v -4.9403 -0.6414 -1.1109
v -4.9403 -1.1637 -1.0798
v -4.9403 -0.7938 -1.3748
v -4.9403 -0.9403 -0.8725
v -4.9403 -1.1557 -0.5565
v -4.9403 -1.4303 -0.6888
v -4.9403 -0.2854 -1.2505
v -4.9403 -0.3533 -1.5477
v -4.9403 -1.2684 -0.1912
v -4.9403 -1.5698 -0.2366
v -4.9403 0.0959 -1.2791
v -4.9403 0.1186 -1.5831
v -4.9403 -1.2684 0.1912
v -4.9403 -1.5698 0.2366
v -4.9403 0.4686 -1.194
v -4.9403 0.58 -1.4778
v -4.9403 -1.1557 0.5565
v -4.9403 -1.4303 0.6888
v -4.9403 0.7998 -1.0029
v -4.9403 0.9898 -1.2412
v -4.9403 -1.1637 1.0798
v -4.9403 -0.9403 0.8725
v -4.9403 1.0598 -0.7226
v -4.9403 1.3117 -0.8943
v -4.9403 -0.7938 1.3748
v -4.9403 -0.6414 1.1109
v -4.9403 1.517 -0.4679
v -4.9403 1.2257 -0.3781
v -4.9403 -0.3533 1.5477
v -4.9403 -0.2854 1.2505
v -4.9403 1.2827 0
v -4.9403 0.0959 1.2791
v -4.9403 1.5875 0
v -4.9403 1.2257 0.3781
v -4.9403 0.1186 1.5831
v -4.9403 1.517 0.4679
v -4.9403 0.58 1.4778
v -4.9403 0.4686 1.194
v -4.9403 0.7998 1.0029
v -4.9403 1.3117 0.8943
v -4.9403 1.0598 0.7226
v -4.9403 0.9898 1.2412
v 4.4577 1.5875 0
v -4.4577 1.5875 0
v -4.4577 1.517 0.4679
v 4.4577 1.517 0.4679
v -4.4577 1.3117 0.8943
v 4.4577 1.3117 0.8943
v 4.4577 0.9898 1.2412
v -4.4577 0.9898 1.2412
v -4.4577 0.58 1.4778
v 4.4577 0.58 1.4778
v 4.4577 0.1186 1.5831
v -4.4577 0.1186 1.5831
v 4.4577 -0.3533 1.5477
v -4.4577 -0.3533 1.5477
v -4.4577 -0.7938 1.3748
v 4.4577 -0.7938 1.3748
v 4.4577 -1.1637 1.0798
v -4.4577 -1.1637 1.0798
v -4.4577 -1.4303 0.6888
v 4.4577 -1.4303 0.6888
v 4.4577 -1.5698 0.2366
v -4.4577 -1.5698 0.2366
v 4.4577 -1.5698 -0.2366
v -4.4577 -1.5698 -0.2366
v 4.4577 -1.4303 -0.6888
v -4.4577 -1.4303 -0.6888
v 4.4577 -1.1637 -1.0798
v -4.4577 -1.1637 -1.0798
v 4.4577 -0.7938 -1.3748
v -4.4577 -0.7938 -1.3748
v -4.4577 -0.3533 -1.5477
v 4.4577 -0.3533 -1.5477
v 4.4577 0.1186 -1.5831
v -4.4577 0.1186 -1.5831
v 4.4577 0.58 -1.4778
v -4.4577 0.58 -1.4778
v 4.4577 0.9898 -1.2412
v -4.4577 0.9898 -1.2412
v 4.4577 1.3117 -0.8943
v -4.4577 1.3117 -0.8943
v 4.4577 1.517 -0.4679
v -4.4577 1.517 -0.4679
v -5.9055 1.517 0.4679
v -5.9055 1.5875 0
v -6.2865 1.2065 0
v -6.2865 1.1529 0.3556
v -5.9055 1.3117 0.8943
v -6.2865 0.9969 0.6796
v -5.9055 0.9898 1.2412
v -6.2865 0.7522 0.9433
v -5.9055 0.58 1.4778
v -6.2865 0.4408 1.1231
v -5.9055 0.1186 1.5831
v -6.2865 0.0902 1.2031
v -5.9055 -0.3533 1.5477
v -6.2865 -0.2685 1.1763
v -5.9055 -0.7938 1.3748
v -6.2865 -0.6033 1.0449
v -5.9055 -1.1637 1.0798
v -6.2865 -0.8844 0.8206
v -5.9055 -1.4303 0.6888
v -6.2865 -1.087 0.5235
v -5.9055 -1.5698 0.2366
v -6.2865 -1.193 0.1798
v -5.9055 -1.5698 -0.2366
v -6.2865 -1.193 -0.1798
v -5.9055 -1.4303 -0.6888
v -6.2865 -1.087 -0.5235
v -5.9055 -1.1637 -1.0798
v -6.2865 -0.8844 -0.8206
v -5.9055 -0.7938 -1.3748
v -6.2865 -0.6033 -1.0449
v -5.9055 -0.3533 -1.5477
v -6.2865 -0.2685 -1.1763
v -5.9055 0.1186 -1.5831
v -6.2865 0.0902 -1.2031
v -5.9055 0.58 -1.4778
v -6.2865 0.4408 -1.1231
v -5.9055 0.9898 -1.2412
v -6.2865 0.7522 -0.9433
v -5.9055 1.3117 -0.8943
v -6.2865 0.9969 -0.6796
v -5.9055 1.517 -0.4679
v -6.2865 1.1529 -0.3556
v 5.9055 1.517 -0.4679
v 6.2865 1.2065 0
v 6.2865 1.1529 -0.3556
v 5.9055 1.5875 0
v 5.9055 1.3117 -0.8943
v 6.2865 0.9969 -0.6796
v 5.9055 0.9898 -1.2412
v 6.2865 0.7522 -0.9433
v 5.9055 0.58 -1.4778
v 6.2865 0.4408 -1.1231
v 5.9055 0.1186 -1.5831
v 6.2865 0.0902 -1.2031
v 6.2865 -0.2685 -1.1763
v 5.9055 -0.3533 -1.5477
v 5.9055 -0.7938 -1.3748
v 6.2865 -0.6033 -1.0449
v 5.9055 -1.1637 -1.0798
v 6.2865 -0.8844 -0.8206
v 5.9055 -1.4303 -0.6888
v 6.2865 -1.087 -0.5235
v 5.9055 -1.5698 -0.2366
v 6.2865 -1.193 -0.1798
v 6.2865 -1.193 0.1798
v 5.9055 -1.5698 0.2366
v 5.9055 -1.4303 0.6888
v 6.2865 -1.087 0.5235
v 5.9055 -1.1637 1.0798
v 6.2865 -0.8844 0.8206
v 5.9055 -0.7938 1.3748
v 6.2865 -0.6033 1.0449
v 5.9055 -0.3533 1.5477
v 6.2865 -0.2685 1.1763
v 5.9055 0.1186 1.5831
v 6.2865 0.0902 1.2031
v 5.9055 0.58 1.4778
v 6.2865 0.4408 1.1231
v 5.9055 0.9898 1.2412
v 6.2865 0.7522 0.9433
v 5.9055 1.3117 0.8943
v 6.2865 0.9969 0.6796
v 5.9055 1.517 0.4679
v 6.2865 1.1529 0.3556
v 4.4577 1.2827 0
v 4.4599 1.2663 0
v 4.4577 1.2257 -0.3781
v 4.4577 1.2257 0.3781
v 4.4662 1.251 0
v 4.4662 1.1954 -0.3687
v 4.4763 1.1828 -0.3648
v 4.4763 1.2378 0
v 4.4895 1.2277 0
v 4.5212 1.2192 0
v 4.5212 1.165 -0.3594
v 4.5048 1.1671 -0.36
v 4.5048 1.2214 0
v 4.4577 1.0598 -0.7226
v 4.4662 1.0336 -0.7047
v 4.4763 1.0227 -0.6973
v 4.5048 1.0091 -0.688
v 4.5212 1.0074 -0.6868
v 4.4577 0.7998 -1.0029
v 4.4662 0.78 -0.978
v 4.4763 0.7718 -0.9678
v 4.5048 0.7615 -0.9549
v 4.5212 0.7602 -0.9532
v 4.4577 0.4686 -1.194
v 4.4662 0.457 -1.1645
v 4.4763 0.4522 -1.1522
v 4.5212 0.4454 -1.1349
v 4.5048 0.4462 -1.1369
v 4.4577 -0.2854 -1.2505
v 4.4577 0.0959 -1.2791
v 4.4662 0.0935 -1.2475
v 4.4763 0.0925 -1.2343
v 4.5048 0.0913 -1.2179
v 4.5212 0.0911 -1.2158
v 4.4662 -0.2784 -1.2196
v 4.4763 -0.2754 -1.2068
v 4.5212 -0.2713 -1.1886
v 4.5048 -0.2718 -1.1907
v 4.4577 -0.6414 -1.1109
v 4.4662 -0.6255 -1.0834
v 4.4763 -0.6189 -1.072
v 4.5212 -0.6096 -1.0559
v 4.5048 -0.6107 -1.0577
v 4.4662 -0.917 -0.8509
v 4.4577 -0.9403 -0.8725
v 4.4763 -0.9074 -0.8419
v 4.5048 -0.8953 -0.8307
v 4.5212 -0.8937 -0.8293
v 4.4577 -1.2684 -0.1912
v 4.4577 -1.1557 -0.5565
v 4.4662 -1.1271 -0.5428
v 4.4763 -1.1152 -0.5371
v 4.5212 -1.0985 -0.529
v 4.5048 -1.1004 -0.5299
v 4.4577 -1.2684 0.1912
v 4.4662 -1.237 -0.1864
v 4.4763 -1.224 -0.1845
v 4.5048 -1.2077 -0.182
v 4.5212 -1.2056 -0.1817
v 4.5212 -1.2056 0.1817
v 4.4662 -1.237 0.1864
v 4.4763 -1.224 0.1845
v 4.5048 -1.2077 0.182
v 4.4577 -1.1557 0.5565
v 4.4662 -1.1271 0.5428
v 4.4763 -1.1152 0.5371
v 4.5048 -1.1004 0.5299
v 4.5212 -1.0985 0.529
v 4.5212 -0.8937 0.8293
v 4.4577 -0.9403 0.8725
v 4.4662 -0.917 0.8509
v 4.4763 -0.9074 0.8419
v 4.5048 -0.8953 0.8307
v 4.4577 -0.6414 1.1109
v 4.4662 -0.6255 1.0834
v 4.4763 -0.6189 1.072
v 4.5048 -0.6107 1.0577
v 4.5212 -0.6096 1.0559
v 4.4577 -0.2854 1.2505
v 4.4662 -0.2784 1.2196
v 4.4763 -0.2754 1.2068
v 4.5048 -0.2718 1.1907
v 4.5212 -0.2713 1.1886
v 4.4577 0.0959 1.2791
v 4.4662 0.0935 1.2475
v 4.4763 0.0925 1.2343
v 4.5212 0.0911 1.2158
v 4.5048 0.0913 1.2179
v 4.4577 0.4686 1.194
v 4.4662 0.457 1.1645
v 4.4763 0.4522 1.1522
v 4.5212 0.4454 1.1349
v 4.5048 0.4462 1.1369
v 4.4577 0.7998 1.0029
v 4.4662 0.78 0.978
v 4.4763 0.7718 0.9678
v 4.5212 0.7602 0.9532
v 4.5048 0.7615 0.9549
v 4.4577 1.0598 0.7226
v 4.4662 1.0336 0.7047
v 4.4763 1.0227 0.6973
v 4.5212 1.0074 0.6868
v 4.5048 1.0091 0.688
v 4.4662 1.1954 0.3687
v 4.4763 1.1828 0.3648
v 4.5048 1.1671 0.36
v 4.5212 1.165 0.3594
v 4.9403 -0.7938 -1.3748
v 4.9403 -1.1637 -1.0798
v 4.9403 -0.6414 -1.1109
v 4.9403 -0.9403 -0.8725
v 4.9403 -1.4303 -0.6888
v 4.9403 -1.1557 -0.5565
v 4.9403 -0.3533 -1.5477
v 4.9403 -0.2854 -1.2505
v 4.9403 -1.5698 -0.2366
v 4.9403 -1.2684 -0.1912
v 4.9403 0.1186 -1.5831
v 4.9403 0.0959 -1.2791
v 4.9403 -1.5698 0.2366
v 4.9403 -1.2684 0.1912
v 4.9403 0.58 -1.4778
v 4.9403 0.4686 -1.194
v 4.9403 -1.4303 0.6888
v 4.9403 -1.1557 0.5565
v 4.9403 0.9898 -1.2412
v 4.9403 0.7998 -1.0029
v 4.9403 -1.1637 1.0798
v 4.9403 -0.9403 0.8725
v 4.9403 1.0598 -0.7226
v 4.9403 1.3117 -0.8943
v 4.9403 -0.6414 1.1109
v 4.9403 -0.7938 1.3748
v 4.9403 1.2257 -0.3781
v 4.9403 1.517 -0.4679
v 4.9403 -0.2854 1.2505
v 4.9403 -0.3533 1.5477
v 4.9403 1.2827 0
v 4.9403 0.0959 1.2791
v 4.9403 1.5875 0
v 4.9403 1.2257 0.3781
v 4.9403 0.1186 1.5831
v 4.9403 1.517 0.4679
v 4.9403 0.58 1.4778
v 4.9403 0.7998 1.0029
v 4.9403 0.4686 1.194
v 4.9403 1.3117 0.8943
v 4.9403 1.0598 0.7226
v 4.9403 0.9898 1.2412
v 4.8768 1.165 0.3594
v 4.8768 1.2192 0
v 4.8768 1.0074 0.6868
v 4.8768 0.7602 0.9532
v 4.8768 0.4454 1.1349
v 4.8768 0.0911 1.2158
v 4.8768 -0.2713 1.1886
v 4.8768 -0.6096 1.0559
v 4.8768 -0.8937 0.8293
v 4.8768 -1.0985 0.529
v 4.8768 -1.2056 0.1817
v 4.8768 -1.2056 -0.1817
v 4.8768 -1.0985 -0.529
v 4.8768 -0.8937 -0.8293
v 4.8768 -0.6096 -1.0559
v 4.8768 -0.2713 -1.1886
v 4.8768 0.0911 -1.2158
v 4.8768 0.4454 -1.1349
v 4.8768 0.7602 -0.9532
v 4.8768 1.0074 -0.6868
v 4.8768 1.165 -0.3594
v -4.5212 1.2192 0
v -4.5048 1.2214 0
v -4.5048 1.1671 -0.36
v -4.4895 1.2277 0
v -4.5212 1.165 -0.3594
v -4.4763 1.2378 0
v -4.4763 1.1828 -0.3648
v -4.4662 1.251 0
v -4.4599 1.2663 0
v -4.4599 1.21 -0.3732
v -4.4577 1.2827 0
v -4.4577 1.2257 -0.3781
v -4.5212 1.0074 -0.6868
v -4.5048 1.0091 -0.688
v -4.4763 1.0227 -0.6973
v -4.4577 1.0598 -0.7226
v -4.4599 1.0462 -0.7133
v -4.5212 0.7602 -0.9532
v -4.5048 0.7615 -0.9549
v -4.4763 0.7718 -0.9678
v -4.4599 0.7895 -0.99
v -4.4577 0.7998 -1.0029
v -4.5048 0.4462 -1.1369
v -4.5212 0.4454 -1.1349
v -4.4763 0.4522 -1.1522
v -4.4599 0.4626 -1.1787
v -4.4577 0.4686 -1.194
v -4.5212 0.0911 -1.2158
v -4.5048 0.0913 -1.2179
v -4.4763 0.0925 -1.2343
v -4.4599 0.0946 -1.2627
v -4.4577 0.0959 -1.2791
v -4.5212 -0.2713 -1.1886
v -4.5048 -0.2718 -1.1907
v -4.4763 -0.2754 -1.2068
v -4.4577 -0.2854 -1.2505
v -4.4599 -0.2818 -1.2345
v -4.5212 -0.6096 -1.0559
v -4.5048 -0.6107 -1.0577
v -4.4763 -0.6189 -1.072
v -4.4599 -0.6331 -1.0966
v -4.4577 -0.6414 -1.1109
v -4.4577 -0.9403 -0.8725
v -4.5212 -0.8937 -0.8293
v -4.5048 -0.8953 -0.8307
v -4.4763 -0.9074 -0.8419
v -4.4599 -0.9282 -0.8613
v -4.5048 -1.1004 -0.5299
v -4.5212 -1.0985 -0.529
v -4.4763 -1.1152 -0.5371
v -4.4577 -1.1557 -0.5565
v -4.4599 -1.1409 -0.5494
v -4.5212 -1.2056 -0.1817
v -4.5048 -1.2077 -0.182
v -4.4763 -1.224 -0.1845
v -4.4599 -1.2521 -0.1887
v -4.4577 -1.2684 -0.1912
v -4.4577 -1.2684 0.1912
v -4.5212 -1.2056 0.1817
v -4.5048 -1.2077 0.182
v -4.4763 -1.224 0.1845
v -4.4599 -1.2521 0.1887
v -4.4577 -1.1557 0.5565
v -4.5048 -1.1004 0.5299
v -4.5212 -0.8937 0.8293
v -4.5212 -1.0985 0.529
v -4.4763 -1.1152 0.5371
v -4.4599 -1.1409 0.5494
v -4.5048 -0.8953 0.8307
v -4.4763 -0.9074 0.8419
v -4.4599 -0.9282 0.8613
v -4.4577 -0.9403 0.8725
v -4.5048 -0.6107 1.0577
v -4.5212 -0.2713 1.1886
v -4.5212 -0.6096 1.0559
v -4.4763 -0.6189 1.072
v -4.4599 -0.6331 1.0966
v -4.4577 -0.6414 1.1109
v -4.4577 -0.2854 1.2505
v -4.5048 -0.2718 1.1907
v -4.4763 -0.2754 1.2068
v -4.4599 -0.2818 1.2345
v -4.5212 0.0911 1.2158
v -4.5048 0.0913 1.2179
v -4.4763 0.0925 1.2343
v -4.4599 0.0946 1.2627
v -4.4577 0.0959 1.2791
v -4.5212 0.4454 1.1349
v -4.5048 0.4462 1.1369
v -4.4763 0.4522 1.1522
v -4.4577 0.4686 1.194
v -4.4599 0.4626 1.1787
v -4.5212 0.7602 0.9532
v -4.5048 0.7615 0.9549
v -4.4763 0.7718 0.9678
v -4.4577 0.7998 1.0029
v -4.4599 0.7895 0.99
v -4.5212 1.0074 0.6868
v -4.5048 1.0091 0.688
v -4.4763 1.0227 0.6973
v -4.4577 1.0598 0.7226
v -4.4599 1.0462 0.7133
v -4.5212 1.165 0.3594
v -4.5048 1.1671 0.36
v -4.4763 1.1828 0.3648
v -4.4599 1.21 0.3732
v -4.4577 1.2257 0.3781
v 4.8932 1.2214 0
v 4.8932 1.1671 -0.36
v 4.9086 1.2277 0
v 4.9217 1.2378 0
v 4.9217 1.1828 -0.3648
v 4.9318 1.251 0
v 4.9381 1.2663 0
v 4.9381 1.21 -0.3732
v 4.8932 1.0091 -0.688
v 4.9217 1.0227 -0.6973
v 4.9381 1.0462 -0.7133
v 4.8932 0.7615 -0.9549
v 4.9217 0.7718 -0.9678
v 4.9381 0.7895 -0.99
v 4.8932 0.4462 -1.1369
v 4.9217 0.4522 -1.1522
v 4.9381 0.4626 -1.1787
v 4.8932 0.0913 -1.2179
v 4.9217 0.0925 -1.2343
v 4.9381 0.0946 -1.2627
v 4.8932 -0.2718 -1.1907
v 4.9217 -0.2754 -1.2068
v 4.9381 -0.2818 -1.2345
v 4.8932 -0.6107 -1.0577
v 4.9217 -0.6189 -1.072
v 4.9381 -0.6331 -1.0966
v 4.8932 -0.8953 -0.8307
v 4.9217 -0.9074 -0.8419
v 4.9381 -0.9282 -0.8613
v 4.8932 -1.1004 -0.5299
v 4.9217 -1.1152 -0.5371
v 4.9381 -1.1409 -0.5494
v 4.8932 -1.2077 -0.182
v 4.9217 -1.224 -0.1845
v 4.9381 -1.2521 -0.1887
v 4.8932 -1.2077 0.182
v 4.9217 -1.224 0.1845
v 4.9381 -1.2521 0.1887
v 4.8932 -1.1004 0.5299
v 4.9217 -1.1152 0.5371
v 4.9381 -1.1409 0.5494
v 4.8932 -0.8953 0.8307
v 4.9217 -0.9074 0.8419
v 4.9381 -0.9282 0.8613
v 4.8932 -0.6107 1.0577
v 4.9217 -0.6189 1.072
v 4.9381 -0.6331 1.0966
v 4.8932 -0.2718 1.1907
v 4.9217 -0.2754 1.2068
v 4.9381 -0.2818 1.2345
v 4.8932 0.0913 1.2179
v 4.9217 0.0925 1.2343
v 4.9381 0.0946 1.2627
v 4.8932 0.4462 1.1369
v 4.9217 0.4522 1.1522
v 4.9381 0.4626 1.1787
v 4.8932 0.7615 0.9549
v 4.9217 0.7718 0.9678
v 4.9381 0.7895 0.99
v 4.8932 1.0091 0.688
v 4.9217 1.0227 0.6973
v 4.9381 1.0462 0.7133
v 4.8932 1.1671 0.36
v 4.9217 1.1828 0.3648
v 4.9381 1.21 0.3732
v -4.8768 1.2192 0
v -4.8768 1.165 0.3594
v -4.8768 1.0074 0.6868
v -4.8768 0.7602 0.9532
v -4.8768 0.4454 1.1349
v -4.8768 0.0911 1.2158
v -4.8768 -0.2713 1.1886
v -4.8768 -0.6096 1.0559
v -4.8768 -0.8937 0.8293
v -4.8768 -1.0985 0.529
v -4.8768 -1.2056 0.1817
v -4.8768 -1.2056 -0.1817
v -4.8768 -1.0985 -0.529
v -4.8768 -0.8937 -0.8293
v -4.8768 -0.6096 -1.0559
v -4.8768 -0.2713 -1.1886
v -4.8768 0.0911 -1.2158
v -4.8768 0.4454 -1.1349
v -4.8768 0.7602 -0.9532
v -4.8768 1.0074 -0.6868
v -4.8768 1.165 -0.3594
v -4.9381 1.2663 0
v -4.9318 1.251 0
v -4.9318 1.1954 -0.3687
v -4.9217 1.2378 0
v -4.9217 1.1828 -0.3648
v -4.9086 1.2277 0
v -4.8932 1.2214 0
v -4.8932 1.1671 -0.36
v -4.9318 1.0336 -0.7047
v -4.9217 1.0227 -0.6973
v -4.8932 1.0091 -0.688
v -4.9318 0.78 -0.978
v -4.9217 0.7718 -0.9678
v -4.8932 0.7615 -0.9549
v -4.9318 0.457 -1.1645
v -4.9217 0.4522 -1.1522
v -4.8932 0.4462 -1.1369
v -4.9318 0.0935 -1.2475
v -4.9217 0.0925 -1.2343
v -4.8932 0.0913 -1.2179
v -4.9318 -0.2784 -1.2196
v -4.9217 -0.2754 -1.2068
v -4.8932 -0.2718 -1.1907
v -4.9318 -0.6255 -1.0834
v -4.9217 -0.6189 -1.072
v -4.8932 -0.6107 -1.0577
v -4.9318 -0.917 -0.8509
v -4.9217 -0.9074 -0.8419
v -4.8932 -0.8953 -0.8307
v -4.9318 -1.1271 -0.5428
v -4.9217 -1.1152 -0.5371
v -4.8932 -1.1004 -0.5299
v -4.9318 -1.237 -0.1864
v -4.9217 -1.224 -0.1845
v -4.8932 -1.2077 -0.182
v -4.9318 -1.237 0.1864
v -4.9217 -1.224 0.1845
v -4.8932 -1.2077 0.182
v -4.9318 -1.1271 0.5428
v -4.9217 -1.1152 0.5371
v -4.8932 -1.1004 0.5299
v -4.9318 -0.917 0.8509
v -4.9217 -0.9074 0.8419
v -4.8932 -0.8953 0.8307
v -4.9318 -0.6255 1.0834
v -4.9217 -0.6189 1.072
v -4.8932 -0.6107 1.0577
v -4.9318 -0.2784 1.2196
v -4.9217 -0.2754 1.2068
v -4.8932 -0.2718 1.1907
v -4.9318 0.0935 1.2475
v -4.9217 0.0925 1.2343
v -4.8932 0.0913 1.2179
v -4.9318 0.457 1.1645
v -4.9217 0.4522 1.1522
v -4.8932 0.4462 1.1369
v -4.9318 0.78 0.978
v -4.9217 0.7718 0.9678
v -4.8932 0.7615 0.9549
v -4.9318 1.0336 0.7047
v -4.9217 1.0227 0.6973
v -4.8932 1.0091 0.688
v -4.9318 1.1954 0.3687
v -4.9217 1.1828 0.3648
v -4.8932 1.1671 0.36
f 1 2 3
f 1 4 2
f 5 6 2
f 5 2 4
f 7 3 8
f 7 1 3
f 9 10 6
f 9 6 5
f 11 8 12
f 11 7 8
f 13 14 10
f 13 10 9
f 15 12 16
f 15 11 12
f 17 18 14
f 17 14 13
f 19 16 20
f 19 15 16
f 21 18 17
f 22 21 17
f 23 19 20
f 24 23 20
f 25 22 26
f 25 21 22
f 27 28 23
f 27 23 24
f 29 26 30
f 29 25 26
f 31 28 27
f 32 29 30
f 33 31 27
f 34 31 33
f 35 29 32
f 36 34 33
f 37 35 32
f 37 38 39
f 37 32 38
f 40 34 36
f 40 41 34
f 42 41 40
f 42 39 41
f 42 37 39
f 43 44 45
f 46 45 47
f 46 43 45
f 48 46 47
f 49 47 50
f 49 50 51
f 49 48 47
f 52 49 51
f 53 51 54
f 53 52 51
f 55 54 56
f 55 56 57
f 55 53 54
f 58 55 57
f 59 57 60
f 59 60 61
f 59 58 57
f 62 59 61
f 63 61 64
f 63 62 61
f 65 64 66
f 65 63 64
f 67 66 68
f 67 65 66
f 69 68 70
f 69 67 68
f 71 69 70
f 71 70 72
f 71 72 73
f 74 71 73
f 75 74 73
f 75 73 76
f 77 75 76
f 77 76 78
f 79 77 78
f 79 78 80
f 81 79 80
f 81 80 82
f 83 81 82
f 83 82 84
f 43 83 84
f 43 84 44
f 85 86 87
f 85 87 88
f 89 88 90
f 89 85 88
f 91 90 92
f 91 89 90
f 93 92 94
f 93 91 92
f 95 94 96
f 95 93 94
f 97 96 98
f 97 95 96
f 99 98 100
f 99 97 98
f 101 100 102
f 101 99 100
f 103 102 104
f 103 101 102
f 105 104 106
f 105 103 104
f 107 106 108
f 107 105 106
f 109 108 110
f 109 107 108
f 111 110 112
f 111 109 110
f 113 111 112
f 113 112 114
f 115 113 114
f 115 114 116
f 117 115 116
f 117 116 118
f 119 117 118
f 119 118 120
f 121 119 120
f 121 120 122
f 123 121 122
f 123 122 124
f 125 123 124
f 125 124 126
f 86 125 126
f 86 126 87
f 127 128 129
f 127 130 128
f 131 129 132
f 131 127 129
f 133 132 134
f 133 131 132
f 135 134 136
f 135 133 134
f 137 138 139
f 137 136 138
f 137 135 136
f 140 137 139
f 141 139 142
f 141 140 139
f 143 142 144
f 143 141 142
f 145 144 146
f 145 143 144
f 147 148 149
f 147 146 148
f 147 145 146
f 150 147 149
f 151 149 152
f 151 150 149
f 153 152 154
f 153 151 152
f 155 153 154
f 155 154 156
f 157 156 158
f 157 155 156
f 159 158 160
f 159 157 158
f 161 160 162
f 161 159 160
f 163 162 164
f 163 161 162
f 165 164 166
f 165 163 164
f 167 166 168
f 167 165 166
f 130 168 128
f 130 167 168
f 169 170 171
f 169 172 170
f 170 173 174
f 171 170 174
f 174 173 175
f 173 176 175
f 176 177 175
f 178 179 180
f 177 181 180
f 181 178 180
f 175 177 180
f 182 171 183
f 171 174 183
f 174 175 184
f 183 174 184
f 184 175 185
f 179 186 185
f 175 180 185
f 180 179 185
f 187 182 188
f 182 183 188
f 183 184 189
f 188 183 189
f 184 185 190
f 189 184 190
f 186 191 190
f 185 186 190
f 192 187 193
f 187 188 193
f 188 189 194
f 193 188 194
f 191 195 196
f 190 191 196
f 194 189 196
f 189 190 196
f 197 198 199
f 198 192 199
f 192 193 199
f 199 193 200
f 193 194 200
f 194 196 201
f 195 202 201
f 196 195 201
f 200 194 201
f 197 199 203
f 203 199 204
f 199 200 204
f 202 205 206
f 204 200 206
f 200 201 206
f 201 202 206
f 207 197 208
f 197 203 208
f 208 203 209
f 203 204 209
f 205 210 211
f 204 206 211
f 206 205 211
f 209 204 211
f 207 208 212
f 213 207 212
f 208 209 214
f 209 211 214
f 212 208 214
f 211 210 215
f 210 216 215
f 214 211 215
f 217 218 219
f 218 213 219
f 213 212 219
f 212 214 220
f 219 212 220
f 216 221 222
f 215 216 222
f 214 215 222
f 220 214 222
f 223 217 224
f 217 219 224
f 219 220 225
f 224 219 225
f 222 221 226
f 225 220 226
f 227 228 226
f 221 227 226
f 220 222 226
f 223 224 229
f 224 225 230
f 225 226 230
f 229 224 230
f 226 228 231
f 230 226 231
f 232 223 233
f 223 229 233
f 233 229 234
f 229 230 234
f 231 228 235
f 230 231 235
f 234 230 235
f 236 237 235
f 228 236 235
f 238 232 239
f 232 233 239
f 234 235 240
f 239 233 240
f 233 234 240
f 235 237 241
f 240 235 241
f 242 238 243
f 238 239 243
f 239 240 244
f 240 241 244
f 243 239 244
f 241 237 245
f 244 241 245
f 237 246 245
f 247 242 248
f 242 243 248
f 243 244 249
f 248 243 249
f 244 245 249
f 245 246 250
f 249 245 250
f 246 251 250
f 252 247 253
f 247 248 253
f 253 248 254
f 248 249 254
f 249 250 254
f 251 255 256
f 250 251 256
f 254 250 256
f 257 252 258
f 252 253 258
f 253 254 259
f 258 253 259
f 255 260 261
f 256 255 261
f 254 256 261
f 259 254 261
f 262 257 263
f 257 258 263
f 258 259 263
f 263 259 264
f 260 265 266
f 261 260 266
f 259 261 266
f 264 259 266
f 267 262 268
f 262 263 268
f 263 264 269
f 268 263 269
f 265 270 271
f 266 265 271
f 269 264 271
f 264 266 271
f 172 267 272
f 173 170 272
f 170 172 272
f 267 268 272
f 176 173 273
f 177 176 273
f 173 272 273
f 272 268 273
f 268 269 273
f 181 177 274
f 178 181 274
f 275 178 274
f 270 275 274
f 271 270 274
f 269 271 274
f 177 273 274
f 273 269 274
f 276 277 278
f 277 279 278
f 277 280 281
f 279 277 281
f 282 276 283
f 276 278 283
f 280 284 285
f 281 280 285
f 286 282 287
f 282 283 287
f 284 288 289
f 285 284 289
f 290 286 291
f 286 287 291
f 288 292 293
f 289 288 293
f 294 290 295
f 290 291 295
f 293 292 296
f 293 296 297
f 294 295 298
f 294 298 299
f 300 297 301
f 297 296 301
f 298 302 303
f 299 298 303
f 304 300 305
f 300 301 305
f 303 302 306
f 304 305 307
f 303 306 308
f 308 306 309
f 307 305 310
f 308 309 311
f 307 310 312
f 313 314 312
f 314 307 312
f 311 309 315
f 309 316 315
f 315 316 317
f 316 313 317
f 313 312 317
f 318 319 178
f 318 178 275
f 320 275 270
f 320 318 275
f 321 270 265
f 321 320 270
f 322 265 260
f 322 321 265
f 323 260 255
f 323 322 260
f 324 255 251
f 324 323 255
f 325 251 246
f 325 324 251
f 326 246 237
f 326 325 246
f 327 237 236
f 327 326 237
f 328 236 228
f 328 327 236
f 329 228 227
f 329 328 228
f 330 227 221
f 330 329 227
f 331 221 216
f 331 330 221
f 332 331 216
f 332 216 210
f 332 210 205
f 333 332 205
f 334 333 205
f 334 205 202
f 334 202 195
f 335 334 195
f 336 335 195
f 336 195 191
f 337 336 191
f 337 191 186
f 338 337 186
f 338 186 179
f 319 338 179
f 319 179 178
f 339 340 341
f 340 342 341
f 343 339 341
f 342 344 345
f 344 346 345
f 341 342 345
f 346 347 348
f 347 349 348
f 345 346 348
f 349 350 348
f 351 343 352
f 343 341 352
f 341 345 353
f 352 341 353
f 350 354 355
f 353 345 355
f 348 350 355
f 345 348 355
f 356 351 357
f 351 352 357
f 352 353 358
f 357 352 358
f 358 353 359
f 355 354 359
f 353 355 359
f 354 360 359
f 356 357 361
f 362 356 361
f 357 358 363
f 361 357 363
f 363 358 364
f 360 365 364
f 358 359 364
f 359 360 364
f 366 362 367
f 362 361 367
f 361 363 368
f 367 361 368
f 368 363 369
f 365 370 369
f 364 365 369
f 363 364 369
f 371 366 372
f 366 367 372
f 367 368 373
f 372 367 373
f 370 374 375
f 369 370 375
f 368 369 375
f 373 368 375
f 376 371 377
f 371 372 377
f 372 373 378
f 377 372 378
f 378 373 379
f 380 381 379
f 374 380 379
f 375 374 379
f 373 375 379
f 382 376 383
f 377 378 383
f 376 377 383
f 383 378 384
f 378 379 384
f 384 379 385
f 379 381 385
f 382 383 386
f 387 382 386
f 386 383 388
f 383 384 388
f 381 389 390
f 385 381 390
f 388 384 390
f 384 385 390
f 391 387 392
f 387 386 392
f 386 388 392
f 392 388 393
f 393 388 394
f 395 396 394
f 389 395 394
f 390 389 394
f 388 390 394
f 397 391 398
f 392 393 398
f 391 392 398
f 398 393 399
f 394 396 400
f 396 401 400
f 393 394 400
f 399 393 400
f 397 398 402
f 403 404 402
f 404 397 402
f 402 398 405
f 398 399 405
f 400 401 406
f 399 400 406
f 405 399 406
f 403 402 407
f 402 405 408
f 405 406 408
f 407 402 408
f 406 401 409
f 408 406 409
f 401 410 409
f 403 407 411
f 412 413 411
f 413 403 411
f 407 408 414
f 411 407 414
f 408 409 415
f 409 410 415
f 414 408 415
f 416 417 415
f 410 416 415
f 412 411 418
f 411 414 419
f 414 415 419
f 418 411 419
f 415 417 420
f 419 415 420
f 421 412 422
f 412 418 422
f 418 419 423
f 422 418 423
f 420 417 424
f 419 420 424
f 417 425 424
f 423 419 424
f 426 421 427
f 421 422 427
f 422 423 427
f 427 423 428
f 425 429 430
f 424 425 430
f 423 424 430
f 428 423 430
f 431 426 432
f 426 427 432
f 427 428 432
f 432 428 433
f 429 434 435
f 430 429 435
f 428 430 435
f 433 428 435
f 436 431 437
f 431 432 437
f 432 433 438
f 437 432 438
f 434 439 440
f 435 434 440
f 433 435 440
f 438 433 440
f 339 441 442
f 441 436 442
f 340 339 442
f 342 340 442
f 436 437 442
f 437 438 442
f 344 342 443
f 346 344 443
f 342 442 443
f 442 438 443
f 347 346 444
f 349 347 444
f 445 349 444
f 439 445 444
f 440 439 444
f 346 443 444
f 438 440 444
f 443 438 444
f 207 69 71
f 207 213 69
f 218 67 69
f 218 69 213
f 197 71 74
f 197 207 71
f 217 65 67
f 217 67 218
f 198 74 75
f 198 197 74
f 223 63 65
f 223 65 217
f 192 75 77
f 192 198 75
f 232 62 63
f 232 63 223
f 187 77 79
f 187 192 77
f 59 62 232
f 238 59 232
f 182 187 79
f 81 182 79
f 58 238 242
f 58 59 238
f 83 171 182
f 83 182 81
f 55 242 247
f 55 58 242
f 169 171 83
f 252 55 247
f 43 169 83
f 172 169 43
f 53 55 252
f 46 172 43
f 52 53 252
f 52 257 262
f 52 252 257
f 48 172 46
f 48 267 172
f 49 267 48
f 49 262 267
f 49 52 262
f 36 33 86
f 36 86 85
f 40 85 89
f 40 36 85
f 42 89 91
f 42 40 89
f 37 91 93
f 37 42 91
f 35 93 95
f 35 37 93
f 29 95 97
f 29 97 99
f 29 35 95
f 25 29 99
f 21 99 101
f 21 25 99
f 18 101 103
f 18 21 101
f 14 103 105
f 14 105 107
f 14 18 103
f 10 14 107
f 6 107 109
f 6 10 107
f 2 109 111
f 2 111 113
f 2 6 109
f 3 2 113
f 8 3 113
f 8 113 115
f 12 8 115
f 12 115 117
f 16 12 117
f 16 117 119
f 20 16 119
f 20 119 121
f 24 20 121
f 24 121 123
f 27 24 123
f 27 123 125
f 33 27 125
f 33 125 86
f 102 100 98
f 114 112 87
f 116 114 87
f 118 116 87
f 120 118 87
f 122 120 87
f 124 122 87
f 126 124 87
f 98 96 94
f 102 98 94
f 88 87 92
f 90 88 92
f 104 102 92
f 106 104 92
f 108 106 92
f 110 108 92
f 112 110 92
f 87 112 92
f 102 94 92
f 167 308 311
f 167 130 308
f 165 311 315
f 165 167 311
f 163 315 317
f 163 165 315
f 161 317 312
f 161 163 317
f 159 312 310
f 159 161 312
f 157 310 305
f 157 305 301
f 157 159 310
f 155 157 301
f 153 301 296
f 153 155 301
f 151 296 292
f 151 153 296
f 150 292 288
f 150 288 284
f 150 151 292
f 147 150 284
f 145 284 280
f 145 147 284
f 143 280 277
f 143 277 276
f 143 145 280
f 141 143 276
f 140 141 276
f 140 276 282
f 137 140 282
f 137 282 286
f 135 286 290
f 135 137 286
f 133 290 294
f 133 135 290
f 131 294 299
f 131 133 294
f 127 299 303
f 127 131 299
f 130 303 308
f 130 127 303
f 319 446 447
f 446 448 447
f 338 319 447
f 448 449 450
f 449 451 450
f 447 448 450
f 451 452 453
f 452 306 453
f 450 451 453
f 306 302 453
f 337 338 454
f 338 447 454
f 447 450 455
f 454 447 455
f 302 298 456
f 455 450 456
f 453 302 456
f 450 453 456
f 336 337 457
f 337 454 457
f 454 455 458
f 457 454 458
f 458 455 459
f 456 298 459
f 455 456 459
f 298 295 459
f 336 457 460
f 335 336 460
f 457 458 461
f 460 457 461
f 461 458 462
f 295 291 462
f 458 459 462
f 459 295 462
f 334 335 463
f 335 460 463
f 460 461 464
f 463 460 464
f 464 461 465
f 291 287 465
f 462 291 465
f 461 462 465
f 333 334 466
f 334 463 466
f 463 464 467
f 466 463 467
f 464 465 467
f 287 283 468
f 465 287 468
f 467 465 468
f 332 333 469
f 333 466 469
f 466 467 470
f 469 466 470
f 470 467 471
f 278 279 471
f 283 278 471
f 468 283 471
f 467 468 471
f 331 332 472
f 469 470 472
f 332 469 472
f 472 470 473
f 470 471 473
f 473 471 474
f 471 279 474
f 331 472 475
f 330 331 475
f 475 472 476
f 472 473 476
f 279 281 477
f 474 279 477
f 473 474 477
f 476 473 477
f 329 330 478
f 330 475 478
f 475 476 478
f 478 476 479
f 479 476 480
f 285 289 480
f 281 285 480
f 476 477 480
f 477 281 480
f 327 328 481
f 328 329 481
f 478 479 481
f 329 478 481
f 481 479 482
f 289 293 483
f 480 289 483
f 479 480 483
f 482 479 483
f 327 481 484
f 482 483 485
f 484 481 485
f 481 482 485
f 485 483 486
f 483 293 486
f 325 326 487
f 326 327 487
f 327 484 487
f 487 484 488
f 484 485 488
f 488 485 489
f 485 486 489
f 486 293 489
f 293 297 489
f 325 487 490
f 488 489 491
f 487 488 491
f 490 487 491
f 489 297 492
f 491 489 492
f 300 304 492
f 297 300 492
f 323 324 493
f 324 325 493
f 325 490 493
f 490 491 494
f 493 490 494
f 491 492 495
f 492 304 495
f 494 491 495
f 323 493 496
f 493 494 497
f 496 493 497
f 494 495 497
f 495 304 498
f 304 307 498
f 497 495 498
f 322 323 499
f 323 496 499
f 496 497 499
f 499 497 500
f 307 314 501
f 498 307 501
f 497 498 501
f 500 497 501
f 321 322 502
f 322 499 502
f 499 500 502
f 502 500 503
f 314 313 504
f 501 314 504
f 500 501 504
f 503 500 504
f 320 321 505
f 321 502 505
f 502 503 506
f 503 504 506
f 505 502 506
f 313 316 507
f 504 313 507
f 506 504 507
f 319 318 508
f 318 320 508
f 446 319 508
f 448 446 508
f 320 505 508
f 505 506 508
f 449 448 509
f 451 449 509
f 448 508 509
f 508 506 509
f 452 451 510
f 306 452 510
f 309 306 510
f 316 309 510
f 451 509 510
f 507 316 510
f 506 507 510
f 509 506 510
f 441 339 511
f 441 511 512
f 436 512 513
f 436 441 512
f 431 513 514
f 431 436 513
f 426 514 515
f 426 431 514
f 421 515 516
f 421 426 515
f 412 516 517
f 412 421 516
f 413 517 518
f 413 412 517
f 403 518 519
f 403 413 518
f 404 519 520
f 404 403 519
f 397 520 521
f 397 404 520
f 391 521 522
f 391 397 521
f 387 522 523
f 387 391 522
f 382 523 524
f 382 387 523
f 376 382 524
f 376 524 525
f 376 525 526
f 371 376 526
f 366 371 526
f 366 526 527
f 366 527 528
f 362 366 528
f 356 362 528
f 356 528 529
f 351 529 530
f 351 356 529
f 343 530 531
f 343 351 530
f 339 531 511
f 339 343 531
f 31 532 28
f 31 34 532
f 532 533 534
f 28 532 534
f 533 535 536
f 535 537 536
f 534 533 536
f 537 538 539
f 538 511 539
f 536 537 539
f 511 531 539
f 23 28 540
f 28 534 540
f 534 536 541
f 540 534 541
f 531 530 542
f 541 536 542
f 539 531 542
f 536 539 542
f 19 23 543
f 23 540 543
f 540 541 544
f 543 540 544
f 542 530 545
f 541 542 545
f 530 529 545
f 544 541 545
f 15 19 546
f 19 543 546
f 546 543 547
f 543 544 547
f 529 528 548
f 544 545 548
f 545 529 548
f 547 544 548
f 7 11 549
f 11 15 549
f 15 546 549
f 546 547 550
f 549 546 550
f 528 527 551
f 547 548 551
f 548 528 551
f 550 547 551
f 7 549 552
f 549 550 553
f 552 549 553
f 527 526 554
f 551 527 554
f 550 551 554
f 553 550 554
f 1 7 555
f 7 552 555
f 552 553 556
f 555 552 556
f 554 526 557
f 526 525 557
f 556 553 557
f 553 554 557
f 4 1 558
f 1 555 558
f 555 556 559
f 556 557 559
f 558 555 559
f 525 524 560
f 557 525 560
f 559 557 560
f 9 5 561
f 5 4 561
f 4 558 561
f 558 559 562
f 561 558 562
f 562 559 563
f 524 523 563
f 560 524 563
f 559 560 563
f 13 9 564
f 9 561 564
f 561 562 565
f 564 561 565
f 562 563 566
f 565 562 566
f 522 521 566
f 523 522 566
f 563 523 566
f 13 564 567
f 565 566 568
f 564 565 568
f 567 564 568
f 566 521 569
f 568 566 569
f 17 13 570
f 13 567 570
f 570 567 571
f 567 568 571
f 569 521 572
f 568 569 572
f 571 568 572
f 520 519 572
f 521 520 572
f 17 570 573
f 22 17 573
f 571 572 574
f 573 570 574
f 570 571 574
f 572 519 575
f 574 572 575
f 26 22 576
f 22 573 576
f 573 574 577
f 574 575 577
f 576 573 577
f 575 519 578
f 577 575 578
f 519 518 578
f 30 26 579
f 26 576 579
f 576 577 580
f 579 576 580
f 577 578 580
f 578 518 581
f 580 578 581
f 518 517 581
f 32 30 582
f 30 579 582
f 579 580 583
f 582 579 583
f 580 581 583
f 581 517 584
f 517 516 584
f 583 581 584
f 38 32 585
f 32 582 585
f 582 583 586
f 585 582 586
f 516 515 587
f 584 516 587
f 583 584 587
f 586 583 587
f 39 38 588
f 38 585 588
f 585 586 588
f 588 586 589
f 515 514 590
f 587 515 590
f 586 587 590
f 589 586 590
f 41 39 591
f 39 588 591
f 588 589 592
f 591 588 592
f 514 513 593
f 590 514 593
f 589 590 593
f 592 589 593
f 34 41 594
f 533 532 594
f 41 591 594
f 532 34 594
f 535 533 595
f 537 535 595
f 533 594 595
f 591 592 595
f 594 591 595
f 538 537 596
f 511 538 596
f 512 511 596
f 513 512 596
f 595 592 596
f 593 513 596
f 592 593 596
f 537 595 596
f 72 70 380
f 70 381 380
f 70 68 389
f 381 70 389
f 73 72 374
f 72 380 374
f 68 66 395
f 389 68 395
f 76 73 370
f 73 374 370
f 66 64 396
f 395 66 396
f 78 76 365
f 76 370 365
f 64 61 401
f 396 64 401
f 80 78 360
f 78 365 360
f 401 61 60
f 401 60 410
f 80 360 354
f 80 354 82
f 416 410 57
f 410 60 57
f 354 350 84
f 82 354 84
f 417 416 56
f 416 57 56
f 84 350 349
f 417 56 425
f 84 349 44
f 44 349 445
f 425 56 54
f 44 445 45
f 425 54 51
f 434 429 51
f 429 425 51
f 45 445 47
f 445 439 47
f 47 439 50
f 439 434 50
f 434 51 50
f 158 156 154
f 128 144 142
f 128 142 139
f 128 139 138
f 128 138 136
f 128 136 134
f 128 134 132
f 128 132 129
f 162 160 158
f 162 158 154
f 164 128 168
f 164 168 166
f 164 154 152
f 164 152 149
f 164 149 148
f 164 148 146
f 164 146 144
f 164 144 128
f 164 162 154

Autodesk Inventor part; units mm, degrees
sketch "Sketch_1" plane through (0, 0, 0) normal (0, 0, 1) x (1, 0, 0)
  line L0 (6.2865, 0) -> (-6.2865, 0)
  line L1 (-6.2865, 0) -> (-6.2865, 1.2065)
  line L2 (-6.2865, 1.2065) -> (-5.9055, 1.5875)
  line L3 (-5.9055, 1.5875) -> (-4.9403, 1.5875)
  line L4 (-4.9403, 1.5875) -> (-4.9403, 1.2827)
  arc A0 (-4.9403, 1.2827) -> (-4.8768, 1.2192) centre (-4.8768, 1.2827) ccw
  line L5 (-4.8768, 1.2192) -> (-4.5212, 1.2192)
  arc A1 (-4.5212, 1.2192) -> (-4.4577, 1.2827) centre (-4.5212, 1.2827) ccw
  line L6 (-4.4577, 1.2827) -> (-4.4577, 1.5875)
  line L7 (-4.4577, 1.5875) -> (4.4577, 1.5875)
  line L8 (4.4577, 1.5875) -> (4.4577, 1.2827)
  arc A2 (4.4577, 1.2827) -> (4.5212, 1.2192) centre (4.5212, 1.2827) ccw
  line L9 (4.5212, 1.2192) -> (4.8768, 1.2192)
  arc A3 (4.8768, 1.2192) -> (4.9403, 1.2827) centre (4.8768, 1.2827) ccw
  line L10 (4.9403, 1.2827) -> (4.9403, 1.5875)
  line L11 (4.9403, 1.5875) -> (5.9055, 1.5875)
  line L12 (5.9055, 1.5875) -> (6.2865, 1.2065)
  line L13 (6.2865, 1.2065) -> (6.2865, 0)
  line L14 (6.2865, 0) -> (-6.2865, 0)
revolve "Revolution1" add sketch "Sketch_1" angle 360 about axis through (6.2865, 0, 0) along (1, 0, 0)
ref_plane "pin_XY" through (0, 0, 0) normal (1, 0, 0) x (0, 0, -1)
ref_plane "pin_YZ" through (0, 0, 0) normal (0, 0, -1) x (0, 1, 0)
ref_plane "pin_ZX" through (0, 0, 0) normal (0, 1, 0) x (1, 0, 0)
ref_plane "rr1_XY" through (4.699, 0, 0) normal (1, 0, 0) x (0, 0, -1)
ref_plane "rr1_YZ" through (4.699, 0, 0) normal (0, 0, -1) x (0, 1, 0)
ref_plane "rr1_ZX" through (4.699, 0, 0) normal (0, 1, 0) x (1, 0, 0)
ref_plane "rr2_XY" through (-4.699, 0, 0) normal (1, 0, 0) x (0, 0, -1)
ref_plane "rr2_YZ" through (-4.699, 0, 0) normal (0, 0, -1) x (0, 1, 0)
ref_plane "rr2_ZX" through (-4.699, 0, 0) normal (0, 1, 0) x (1, 0, 0)
ref_plane "w21_XY" through (6.2865, 0, 0) normal (0, 1, 0) x (1, 0, 0)
ref_plane "w21_YZ" through (6.2865, 0, 0) normal (1, 0, 0) x (0, 0, -1)
ref_plane "w21_ZX" through (6.2865, 0, 0) normal (0, 0, -1) x (0, 1, 0)
ref_plane "w22_XY" through (-6.2865, 0, 0) normal (0, 1, 0) x (1, 0, 0)
ref_plane "w22_YZ" through (-6.2865, 0, 0) normal (1, 0, 0) x (0, 0, -1)
ref_plane "w22_ZX" through (-6.2865, 0, 0) normal (0, 0, -1) x (0, 1, 0)
ref_plane "p1_XY" through (0, 0, 1.5875) normal (1, 0, 0) x (0, 0, -1)
ref_plane "p1_YZ" through (0, 0, 1.5875) normal (0, 0, -1) x (0, 1, 0)
ref_plane "p1_ZX" through (0, 0, 1.5875) normal (0, 1, 0) x (1, 0, 0)
ref_plane "p2_XY" through (0, 0, -1.5875) normal (1, 0, 0) x (0, 0, -1)
ref_plane "p2_YZ" through (0, 0, -1.5875) normal (0, 0, -1) x (0, 1, 0)
ref_plane "p2_ZX" through (0, 0, -1.5875) normal (0, 1, 0) x (1, 0, 0)
properties part number "D-25368"
